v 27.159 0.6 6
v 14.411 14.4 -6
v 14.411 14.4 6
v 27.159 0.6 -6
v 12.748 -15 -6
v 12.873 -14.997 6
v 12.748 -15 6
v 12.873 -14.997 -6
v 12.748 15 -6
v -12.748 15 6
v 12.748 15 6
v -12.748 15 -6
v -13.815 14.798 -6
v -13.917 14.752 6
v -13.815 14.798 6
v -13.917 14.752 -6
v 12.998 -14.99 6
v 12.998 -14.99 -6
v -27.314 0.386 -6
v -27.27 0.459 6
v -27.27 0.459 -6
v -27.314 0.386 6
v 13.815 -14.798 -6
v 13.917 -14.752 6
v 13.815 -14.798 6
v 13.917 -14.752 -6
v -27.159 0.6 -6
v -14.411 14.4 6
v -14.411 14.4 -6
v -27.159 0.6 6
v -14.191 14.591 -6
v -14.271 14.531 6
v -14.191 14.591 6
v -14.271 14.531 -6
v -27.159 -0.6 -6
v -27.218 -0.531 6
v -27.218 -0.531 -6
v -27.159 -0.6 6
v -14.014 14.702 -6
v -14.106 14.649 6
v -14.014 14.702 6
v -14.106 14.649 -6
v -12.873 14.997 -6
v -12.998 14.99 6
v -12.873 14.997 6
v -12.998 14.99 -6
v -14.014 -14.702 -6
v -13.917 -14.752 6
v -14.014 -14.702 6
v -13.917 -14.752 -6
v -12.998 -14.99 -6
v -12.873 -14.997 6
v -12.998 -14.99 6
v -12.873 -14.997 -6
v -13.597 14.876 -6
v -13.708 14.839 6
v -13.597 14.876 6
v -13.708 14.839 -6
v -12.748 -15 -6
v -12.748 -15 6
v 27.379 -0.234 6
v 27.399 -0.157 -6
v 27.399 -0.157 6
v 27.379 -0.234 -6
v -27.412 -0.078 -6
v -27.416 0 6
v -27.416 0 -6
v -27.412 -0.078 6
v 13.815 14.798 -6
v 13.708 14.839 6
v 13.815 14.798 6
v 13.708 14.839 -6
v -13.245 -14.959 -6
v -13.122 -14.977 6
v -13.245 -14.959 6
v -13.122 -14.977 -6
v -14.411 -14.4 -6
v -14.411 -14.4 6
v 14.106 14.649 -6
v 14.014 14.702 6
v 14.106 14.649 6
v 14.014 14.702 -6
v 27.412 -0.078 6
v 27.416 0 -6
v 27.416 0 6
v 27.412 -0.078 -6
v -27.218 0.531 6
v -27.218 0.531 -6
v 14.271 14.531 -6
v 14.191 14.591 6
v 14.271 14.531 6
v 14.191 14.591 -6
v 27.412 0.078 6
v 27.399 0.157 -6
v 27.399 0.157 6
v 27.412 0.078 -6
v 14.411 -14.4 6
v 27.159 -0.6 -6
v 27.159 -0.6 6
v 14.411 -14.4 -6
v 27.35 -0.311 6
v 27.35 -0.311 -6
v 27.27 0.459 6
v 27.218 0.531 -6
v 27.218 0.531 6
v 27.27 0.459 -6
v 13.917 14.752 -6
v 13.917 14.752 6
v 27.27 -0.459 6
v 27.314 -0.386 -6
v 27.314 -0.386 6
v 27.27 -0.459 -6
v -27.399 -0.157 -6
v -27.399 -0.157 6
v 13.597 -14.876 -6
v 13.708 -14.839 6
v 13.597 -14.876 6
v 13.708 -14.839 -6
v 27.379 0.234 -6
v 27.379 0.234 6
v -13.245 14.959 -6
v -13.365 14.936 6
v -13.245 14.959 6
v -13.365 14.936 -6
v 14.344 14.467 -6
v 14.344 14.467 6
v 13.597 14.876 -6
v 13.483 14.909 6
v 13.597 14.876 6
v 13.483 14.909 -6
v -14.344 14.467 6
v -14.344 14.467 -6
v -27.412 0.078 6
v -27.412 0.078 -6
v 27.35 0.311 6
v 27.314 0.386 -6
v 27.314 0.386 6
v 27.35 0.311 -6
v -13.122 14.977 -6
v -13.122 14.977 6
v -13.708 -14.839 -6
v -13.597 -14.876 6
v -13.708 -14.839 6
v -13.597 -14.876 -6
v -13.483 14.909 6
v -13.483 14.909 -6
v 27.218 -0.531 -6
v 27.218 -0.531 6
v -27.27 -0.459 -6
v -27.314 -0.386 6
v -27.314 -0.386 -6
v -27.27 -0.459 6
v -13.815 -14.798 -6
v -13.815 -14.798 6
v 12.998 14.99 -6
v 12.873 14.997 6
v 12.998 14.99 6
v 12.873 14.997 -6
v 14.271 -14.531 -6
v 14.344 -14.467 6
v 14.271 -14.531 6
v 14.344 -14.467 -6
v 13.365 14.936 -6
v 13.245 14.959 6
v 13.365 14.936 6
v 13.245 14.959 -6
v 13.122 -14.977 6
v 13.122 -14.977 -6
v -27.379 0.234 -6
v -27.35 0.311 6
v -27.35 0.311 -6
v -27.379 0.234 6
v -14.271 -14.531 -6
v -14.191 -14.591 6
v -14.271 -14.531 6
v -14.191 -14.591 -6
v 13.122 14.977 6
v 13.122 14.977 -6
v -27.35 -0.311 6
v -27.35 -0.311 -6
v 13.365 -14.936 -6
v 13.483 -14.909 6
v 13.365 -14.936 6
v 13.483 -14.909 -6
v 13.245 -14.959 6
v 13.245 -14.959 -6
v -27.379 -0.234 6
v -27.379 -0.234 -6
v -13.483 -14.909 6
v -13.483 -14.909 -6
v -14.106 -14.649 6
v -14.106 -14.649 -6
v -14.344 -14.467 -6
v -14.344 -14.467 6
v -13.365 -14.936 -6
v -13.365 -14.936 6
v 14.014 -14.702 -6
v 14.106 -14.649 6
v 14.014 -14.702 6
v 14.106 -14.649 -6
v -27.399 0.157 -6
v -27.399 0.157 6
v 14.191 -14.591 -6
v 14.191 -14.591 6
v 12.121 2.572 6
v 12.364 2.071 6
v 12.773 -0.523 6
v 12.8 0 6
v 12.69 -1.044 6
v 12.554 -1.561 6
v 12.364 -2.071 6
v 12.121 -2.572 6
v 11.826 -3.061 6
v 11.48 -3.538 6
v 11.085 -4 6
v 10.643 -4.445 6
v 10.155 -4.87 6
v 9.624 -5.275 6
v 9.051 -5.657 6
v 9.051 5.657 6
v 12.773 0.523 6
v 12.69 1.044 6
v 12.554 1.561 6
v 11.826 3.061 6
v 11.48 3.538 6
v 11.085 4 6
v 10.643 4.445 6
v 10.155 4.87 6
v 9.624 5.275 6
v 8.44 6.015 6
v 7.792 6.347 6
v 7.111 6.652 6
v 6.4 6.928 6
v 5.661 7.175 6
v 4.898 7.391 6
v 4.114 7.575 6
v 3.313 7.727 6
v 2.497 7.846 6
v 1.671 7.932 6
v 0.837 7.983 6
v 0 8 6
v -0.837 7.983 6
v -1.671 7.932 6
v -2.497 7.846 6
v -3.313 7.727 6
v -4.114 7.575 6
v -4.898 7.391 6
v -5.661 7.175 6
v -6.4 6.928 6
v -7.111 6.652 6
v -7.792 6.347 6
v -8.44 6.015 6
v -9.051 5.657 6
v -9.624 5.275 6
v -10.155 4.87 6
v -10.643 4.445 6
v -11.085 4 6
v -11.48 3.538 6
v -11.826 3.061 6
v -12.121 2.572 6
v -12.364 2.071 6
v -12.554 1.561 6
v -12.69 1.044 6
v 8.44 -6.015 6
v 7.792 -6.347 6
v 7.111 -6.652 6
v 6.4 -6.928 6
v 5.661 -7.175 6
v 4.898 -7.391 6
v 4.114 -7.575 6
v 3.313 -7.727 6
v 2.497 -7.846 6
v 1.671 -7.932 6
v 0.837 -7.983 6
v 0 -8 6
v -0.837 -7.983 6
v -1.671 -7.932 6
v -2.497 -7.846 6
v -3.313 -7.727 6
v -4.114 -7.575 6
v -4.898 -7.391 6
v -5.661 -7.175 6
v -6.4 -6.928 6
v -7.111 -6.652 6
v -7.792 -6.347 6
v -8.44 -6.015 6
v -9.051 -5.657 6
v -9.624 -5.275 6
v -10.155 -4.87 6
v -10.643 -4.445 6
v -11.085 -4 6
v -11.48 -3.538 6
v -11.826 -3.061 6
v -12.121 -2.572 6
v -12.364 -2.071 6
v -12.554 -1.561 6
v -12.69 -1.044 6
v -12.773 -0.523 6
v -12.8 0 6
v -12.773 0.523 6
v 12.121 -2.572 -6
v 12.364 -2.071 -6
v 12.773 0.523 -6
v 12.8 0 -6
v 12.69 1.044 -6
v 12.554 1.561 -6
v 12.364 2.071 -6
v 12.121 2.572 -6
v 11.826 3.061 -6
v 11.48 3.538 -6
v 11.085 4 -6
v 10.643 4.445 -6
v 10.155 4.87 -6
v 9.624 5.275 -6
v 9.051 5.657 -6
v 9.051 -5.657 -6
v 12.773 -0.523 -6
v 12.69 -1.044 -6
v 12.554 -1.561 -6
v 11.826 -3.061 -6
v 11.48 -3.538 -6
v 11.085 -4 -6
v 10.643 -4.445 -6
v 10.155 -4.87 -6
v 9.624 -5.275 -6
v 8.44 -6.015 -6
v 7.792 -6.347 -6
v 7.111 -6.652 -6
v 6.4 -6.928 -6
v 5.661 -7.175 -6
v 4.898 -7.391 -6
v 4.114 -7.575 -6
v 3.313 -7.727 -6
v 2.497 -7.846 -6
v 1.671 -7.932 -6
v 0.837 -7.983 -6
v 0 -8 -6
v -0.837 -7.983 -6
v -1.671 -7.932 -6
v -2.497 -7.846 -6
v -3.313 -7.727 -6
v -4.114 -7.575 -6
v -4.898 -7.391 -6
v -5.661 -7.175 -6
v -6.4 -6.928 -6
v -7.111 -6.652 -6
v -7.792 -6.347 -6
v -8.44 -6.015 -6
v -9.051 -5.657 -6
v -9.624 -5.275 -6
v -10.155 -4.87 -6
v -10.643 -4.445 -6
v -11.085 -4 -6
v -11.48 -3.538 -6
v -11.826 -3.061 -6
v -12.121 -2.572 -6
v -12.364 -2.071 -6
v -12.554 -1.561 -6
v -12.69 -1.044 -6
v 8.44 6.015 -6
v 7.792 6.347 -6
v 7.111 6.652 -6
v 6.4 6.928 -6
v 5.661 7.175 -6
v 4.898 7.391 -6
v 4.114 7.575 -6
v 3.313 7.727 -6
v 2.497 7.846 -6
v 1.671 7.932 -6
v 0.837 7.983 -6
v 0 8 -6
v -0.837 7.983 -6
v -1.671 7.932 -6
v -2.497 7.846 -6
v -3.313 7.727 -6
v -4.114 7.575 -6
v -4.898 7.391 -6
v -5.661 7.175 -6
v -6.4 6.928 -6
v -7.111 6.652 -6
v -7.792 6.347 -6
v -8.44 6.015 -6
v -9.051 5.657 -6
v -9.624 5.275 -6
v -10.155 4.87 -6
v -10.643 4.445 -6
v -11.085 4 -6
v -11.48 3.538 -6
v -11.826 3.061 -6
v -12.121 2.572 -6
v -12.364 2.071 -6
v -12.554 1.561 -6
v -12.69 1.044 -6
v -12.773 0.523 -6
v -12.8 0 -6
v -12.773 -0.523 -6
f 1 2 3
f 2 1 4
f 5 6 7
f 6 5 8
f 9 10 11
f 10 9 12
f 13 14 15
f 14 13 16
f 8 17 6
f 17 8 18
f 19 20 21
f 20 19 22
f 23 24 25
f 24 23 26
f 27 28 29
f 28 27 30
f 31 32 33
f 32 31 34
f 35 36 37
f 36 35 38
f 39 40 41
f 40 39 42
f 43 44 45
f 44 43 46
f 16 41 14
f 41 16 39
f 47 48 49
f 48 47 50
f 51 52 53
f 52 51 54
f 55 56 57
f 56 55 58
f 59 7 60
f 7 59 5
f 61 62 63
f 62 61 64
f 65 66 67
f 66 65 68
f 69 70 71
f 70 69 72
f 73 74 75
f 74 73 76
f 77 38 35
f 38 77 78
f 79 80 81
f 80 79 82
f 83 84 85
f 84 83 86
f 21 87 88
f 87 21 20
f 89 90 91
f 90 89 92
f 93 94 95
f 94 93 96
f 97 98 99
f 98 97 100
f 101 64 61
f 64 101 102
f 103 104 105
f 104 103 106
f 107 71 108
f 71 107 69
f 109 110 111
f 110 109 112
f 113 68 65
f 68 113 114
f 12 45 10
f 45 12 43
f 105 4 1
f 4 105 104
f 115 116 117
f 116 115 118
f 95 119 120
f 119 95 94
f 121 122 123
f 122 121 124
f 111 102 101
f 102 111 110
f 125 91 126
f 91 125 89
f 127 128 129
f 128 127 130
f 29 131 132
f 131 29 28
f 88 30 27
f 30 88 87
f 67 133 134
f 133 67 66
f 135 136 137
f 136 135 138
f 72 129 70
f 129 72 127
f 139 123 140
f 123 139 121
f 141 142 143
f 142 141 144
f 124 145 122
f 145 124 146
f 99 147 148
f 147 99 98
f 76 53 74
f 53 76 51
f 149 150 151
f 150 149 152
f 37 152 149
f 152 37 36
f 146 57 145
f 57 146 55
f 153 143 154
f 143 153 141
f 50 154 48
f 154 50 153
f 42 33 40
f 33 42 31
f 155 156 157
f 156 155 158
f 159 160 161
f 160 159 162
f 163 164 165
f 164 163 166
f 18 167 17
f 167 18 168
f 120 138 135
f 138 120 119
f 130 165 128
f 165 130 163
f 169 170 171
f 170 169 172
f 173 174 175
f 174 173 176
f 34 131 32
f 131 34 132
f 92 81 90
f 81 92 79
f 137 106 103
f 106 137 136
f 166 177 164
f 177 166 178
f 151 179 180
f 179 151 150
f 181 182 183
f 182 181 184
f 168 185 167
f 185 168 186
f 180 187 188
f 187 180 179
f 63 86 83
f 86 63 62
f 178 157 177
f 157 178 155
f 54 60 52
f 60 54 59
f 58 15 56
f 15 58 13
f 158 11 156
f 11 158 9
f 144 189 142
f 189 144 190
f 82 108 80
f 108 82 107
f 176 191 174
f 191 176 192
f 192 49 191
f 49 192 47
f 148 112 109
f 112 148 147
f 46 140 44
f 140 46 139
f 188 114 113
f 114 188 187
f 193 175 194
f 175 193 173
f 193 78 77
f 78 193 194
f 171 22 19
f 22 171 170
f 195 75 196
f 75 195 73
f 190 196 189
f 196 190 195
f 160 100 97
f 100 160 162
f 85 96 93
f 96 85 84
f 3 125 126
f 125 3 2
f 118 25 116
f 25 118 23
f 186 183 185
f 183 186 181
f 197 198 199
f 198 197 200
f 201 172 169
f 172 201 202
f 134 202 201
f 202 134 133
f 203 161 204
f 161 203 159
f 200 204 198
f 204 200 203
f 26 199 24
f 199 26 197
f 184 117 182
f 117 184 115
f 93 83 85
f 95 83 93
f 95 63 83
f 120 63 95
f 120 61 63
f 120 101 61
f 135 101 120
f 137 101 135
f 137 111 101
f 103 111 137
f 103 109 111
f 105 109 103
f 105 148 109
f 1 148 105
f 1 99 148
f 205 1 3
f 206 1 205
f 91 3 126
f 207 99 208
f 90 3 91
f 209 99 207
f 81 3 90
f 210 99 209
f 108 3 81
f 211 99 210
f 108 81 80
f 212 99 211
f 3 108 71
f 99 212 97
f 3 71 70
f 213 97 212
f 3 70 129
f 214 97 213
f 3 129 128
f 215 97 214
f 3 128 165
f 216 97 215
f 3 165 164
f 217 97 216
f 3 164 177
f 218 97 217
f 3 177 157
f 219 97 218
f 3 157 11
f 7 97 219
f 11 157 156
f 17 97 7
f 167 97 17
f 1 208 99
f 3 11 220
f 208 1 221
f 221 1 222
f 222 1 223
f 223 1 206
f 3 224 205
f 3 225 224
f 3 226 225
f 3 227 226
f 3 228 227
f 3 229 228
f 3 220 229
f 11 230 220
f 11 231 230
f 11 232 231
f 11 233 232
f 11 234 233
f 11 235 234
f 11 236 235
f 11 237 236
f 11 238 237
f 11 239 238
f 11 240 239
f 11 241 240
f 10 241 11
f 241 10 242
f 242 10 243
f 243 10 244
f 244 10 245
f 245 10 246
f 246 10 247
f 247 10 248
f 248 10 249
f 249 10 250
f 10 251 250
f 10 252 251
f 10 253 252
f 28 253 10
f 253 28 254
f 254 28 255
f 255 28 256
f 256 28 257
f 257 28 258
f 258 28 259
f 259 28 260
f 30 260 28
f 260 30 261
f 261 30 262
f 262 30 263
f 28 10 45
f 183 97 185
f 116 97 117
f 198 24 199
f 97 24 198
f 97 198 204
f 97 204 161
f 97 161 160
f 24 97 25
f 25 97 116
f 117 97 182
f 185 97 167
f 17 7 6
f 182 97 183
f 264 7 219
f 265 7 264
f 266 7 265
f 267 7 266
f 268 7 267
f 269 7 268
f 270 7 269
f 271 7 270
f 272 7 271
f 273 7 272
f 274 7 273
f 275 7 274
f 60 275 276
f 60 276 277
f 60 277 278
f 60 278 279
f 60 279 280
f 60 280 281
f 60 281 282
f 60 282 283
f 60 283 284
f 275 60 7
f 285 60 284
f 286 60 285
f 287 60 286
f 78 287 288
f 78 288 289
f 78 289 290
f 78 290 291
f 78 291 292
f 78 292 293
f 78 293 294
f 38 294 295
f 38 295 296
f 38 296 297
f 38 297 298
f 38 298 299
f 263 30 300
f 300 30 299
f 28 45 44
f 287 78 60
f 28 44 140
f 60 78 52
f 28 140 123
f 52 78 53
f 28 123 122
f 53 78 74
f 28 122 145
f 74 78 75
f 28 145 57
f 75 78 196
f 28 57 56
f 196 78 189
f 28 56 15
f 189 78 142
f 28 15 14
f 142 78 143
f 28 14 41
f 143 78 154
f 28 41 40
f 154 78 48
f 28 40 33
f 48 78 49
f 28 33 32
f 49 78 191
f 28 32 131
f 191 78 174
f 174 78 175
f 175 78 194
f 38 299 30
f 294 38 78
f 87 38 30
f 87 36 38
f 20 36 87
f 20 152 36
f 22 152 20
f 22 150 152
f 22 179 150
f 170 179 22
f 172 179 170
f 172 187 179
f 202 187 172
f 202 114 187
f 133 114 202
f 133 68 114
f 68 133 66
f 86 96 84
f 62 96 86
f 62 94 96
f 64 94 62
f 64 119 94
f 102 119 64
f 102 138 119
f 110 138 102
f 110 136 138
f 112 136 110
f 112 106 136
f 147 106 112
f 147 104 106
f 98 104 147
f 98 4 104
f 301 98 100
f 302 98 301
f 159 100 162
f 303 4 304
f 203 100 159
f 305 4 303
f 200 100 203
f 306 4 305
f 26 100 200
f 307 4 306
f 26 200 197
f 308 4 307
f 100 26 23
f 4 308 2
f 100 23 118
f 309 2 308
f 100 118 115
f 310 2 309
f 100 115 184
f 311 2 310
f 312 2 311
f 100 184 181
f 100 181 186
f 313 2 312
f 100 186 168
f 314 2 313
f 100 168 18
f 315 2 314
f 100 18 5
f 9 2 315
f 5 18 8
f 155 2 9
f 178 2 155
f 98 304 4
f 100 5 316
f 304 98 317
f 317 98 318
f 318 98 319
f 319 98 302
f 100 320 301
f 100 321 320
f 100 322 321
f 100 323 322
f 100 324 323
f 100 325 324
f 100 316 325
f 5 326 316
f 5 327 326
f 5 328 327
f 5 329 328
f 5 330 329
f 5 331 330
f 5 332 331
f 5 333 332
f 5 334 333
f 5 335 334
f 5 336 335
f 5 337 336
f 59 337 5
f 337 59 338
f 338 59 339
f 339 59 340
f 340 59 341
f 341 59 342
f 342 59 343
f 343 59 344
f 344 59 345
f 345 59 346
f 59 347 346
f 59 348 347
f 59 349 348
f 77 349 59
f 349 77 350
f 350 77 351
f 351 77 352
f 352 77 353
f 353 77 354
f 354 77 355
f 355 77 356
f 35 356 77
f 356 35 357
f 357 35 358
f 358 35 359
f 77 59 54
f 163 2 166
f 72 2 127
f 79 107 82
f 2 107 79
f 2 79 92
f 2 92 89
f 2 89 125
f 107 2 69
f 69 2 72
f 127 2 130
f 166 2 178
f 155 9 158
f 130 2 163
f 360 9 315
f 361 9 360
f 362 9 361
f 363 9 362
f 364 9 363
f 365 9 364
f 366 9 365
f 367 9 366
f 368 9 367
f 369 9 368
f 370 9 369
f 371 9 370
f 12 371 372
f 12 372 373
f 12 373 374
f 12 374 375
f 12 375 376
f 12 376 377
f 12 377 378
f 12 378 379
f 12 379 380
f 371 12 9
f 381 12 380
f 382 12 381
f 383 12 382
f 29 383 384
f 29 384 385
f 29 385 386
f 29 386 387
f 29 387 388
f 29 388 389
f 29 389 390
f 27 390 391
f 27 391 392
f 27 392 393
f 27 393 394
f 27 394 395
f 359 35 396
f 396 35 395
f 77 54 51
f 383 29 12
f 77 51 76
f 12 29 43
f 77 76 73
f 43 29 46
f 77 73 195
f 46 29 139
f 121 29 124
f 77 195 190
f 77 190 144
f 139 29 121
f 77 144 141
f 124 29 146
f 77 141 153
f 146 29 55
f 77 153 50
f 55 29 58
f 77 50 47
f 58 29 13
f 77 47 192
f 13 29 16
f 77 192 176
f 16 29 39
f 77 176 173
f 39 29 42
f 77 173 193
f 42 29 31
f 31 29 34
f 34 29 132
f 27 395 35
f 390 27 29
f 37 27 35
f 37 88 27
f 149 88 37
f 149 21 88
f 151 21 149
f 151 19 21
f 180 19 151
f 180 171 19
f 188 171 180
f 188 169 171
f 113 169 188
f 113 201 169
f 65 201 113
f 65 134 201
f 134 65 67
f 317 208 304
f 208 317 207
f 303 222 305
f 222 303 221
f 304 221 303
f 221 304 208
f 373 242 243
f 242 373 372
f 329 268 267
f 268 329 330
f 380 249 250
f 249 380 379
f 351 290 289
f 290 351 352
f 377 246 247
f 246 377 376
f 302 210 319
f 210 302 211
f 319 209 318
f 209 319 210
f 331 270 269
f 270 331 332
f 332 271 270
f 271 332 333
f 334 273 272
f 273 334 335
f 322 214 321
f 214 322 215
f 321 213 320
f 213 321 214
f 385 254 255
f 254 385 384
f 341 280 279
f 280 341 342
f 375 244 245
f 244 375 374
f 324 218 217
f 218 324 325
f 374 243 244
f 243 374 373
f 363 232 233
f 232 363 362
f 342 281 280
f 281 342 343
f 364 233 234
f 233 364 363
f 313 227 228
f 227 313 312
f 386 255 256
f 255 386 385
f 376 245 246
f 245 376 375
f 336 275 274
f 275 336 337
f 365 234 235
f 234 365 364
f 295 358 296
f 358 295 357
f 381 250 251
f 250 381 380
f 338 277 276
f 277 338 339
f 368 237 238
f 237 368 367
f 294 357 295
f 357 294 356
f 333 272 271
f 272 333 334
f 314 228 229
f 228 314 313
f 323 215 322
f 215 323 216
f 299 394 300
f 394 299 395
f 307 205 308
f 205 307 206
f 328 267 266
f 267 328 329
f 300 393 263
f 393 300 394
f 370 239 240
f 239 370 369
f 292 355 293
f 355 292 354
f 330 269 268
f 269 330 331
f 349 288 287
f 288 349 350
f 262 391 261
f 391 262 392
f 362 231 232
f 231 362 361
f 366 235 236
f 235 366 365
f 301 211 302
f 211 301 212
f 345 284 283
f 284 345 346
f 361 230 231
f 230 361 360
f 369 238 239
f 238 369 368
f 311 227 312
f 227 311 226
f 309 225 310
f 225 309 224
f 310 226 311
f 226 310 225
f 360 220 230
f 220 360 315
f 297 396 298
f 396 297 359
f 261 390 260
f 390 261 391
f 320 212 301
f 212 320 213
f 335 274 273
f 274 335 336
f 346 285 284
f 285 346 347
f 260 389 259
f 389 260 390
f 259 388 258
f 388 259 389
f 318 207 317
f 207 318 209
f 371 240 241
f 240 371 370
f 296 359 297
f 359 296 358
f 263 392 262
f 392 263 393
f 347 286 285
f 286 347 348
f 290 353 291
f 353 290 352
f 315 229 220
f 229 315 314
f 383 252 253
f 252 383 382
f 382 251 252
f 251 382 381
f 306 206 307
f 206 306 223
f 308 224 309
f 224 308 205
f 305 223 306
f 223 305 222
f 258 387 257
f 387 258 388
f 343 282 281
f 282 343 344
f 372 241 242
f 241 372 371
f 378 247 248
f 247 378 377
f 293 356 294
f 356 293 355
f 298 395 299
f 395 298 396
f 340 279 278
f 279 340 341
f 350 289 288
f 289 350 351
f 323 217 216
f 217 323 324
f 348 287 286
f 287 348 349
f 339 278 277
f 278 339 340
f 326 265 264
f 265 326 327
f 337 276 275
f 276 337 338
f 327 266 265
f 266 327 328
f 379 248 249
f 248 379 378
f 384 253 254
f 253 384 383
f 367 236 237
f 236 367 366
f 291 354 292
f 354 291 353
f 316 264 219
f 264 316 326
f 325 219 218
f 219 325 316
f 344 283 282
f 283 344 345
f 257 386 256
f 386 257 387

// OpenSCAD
$fn=96;

outer_flat = 30;
thickness = 12;
hole_d = 16;
elongation = 1.6;
corner_round = 1.2;
edge_chamfer = 0.8;

module hex2d(flat=30){
    r = flat / sqrt(3);
    polygon(points=[for(i=[0:5]) [r*cos(60*i), r*sin(60*i)]]);
}

module rounded_hex_prism(flat=30, h=10, rr=1.0){
    linear_extrude(height=h, center=true)
        offset(r=rr)
            offset(delta=-rr)
                hex2d(flat);
}

module chamfered_rounded_hex_ring(flat=30, h=10, rr=1.0, ch=0.8, hole=16){
    difference(){
        union(){
            rounded_hex_prism(flat=flat, h=h-2*ch, rr=rr);
            translate([0,0,(h/2)-(ch/2)]) rounded_hex_prism(flat=flat, h=ch, rr=rr);
            translate([0,0,(-h/2)+(ch/2)]) rounded_hex_prism(flat=flat, h=ch, rr=rr);
        }
        cylinder(h=h+2, d=hole, center=true);
    }
}

scale([elongation,1,1])
    chamfered_rounded_hex_ring(flat=outer_flat, h=thickness, rr=corner_round, ch=edge_chamfer, hole=hole_d);
